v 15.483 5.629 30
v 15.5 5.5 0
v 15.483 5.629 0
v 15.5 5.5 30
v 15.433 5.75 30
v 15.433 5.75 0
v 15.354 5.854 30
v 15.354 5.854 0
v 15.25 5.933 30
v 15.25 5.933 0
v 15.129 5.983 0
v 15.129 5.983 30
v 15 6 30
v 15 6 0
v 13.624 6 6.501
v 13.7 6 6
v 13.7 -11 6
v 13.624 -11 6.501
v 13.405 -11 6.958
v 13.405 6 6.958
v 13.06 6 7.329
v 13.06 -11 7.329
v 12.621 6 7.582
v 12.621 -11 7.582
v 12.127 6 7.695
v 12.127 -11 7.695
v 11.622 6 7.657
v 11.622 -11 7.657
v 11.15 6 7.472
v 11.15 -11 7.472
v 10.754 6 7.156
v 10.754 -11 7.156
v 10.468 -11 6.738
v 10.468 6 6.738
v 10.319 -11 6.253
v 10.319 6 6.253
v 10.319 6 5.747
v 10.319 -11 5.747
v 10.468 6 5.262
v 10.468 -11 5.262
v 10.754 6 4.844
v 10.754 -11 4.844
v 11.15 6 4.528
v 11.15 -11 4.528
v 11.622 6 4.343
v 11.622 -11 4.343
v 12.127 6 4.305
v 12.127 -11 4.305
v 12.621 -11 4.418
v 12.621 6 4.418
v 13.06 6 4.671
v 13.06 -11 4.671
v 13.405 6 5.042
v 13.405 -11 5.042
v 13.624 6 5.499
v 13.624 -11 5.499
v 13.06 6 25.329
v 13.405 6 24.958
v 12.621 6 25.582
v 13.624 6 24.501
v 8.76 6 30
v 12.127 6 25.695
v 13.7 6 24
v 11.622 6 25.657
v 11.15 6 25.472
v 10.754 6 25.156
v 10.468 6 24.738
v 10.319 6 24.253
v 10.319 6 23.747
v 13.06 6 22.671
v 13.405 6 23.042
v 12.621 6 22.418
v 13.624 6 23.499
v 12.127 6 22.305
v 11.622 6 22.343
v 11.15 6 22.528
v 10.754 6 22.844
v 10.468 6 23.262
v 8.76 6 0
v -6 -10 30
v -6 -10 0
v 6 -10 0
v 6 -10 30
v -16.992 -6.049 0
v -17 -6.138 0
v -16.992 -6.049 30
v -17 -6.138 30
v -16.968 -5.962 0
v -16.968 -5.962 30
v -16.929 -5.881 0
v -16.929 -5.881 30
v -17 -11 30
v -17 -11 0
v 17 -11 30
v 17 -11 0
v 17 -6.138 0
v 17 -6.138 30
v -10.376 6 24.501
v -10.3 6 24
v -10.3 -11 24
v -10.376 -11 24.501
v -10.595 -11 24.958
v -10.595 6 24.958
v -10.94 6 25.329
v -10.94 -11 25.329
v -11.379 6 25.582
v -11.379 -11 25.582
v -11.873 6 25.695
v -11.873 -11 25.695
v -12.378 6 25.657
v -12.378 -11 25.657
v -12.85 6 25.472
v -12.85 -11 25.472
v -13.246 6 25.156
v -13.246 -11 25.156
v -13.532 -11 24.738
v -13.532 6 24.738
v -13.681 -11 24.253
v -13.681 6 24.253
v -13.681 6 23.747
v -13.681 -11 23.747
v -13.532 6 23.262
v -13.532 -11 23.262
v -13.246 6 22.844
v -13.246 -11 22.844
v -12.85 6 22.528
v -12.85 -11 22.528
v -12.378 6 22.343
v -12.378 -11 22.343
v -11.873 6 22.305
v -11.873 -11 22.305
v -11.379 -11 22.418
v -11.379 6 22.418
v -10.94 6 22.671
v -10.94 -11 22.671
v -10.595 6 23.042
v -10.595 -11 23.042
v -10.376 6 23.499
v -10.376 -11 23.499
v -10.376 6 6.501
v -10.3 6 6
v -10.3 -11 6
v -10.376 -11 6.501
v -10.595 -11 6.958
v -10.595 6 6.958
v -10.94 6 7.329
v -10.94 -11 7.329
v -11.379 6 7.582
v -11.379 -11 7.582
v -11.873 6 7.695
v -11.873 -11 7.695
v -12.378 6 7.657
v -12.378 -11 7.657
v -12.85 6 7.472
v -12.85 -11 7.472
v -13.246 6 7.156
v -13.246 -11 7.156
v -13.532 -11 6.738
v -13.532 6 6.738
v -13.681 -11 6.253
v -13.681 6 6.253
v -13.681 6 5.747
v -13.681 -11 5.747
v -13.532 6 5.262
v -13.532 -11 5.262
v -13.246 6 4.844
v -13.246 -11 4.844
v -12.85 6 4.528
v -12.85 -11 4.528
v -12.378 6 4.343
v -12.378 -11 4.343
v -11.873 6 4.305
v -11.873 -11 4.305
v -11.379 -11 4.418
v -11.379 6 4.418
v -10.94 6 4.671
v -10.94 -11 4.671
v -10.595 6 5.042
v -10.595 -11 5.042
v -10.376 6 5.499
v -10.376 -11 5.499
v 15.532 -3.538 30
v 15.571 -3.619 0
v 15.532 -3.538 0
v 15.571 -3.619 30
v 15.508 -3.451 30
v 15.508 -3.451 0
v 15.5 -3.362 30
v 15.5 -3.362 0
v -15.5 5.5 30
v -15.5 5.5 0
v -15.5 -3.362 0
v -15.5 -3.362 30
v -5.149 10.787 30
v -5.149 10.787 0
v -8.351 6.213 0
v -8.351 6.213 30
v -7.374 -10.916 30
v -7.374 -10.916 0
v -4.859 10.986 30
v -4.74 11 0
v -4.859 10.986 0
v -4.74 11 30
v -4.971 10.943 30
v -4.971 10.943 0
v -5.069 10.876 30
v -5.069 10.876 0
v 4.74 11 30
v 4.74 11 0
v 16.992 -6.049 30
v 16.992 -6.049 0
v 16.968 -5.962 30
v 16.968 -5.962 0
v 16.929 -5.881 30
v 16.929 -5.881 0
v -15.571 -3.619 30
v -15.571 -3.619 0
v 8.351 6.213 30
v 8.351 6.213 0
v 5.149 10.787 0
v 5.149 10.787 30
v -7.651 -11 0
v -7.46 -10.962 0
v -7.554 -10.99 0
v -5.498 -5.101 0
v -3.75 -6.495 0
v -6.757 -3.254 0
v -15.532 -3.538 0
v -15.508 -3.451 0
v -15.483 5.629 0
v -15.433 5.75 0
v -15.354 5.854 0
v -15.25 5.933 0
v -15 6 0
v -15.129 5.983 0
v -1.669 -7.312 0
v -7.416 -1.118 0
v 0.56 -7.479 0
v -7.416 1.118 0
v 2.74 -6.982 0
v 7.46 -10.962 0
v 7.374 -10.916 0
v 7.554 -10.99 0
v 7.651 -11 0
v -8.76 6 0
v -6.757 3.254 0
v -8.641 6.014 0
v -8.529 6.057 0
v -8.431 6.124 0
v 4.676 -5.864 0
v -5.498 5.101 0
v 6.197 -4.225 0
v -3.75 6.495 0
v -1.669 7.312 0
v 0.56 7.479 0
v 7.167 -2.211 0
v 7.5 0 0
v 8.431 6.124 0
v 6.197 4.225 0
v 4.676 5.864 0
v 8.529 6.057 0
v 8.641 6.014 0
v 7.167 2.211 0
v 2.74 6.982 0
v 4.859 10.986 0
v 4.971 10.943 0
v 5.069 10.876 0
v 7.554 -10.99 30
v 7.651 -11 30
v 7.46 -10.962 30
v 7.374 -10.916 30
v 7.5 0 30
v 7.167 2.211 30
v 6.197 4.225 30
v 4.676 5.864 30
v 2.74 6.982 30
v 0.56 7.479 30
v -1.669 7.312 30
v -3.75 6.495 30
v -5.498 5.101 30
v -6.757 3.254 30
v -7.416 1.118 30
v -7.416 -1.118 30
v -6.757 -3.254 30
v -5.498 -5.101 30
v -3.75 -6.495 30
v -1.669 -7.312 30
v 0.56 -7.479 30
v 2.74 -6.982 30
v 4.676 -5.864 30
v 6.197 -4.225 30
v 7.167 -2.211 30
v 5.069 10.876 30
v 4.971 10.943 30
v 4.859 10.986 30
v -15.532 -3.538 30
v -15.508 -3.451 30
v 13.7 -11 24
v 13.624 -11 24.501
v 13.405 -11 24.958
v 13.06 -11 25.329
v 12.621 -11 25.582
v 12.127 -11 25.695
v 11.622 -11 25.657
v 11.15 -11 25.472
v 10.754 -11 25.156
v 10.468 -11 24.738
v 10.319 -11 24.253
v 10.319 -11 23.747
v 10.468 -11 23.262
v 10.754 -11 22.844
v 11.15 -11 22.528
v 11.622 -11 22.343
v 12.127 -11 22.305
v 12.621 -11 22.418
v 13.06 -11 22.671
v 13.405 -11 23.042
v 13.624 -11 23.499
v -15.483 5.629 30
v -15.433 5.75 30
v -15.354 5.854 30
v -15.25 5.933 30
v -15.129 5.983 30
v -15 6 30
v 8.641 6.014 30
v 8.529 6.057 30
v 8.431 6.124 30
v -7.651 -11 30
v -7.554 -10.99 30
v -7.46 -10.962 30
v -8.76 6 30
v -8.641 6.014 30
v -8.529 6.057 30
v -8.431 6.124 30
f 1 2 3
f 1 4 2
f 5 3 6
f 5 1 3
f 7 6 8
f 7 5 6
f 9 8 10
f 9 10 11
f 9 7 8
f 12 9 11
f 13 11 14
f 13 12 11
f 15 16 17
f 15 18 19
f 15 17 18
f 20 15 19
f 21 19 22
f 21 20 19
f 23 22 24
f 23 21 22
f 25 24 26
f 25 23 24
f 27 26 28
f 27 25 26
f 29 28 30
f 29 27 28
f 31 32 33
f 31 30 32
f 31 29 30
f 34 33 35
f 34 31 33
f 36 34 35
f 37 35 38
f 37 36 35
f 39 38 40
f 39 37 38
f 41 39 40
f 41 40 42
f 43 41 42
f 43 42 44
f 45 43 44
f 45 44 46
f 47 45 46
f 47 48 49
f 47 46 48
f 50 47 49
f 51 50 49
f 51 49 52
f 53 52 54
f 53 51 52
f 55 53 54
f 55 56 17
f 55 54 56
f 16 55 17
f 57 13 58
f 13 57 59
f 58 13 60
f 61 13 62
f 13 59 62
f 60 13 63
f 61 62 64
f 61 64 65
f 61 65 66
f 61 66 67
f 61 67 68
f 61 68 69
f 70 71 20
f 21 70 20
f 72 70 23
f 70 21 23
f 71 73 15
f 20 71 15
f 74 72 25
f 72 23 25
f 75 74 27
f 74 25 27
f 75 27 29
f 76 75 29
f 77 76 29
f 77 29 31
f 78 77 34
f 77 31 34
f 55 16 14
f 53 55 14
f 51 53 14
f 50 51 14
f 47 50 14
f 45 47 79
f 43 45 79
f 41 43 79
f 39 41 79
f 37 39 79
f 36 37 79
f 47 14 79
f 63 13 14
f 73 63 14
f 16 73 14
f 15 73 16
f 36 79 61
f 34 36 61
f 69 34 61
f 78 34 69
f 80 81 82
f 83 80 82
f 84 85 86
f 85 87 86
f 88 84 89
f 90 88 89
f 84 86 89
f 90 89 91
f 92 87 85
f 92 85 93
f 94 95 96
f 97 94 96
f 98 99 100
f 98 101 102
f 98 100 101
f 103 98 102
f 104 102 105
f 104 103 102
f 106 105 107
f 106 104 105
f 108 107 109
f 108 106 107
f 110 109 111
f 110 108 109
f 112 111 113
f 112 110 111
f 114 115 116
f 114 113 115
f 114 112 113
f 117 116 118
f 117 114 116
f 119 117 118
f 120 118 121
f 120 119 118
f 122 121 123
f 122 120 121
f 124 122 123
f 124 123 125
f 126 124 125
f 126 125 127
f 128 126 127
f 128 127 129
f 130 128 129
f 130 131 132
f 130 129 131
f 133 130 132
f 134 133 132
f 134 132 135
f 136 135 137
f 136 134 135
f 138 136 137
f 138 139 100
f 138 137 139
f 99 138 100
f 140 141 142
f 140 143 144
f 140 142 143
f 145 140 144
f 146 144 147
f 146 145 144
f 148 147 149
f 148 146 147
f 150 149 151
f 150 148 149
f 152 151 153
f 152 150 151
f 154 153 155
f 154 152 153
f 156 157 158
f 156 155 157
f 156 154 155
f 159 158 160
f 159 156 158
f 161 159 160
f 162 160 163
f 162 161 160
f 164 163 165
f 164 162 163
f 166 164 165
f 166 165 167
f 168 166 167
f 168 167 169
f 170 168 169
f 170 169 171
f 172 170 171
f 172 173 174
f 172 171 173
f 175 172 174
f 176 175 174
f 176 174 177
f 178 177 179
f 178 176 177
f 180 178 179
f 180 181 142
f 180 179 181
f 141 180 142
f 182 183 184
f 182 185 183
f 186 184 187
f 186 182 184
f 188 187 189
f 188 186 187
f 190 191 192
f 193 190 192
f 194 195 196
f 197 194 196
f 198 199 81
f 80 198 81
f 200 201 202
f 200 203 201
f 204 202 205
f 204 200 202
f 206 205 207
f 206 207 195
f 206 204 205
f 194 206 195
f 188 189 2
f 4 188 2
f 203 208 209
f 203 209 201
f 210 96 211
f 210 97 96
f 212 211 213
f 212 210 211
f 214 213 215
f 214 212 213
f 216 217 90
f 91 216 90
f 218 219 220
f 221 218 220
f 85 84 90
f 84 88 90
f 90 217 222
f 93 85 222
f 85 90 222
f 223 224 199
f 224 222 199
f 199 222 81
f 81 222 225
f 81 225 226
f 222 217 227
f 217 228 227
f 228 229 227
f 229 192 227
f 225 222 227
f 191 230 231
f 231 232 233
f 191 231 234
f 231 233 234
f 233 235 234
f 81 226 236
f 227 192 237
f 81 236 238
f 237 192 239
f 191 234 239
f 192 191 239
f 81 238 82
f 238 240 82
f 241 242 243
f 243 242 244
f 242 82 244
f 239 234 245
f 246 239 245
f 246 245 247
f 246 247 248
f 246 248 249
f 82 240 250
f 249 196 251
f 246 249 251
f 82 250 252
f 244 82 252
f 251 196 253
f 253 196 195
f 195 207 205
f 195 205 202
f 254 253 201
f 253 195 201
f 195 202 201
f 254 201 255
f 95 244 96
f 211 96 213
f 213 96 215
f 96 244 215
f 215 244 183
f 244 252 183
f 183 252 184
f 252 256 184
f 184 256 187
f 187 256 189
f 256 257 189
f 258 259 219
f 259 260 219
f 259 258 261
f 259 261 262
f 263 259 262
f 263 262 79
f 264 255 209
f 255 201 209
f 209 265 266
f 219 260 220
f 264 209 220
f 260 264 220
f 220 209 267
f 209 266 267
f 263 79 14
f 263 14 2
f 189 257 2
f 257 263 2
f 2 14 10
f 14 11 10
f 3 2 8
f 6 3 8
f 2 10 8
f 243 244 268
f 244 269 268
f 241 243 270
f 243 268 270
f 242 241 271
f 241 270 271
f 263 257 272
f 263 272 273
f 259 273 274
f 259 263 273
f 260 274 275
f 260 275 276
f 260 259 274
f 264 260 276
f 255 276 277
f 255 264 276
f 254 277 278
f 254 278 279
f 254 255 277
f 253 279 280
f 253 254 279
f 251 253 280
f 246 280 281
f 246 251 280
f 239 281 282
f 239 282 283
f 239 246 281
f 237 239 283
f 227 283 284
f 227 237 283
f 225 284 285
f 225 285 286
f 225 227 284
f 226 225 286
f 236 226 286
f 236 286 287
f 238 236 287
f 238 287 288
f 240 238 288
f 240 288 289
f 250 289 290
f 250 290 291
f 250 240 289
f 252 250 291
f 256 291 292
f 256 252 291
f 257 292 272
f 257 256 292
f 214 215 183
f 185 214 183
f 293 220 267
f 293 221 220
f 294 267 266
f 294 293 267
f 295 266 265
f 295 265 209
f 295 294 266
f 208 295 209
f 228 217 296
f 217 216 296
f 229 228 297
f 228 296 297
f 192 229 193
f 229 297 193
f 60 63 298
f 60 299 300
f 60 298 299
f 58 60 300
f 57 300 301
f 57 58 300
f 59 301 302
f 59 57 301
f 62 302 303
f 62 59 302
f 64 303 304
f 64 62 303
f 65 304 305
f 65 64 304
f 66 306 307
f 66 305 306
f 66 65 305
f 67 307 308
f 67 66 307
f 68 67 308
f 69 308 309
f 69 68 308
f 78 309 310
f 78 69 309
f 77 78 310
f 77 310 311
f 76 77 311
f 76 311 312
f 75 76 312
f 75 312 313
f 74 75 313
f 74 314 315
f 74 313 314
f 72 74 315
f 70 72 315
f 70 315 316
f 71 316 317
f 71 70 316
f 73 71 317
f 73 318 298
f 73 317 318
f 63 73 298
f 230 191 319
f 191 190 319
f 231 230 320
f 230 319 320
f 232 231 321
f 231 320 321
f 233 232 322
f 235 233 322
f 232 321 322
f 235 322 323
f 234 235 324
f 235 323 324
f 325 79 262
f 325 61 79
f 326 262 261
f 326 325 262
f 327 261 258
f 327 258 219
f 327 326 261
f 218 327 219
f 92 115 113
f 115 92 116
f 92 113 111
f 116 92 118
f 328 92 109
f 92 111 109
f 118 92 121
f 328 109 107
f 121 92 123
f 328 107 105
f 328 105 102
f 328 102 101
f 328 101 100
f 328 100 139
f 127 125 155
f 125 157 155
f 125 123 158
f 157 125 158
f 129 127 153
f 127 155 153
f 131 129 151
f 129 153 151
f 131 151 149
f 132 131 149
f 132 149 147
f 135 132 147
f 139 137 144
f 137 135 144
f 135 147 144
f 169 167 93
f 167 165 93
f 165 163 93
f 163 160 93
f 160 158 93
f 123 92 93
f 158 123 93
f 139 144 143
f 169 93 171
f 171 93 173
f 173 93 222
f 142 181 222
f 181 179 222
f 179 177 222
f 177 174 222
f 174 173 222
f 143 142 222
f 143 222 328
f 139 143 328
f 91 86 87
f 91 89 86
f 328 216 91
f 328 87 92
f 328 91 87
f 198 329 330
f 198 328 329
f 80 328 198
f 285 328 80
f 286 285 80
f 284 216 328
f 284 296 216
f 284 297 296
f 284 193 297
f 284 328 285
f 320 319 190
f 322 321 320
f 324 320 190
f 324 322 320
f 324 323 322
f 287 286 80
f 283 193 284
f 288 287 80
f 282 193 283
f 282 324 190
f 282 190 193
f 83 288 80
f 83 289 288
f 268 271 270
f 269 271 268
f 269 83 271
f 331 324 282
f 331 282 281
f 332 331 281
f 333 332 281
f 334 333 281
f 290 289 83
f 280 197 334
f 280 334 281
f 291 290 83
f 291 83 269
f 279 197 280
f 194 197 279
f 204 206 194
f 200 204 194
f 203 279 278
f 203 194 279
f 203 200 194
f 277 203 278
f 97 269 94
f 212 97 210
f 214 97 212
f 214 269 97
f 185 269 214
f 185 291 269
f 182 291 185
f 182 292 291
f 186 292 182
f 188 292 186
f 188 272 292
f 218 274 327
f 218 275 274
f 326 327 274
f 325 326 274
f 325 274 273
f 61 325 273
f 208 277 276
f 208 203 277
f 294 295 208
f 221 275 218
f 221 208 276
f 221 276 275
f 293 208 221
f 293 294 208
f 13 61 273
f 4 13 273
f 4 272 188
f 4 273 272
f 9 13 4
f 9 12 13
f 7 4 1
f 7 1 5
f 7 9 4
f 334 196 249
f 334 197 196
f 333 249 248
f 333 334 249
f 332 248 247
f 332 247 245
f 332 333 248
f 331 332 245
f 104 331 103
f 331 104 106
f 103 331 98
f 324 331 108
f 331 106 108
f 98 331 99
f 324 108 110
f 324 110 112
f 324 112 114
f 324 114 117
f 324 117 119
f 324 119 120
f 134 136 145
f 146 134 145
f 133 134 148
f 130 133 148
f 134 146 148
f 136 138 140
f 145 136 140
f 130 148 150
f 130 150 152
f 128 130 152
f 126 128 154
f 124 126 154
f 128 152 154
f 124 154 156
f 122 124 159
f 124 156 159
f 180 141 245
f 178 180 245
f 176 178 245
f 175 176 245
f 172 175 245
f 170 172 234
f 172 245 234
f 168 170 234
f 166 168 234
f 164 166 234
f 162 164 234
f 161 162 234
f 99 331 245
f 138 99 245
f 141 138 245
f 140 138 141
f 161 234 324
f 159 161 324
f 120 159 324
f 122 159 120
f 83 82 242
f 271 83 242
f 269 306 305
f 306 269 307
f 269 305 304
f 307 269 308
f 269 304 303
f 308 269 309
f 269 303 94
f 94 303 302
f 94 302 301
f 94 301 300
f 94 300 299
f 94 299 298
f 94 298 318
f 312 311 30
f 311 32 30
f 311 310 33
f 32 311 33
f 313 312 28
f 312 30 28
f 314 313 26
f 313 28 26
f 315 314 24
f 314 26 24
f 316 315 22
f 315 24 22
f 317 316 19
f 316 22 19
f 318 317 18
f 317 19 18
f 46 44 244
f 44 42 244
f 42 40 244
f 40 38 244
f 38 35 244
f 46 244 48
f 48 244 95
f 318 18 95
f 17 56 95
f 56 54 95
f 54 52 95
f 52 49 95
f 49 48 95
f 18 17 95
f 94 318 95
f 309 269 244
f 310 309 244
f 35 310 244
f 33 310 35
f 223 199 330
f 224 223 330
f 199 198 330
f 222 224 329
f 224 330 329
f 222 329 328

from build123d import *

# Parameters (mm, degrees)
SKETCH_R     = 7.5
PAD_DEPTH    = 30
SKETCH001_R  = 1.7
POCKET_DEPTH = 61.001
FILLET_R     = 0.5


with BuildPart() as part:
    # Sketch → Pad (new body)
    with BuildSketch(Plane.XY):
        Polygon((7.5, -11), (17, -11), (17, -6), (15.5, -3.5), (15.5, 6), (8.5, 6), (5, 11), (0, 11), (-5, 11), (-8.5, 6), (-15.5, 6), (-15.5, -3.5), (-17, -6), (-17, -11), (-7.5, -11), (-6, -10), (0, -10), (6, -10), align=None)
        Circle(SKETCH_R, mode=Mode.SUBTRACT)
    extrude(amount=PAD_DEPTH)

    # Sketch001 → Pocket (cut, through all)
    with BuildSketch(Plane.XZ.offset(-50)):
        with Locations((-12, 24)):
            Circle(SKETCH001_R)
        with Locations((12, 24)):
            Circle(SKETCH001_R)
        with Locations((-12, 6)):
            Circle(SKETCH001_R)
        with Locations((12, 6)):
            Circle(SKETCH001_R)
    extrude(amount=POCKET_DEPTH, mode=Mode.SUBTRACT)

    # Fillet
    fillet_edges = [part.edges().sort_by_distance(p)[0] for p in [
        (-5, 11, 15),
        (5, 11, 15),
        (-15.5, 6, 15),
        (-17, -6, 15),
        (15.5, 6, 15),
        (17, -6, 15),
        (-7.5, -11, 15),
        (7.5, -11, 15),
        (-8.5, 6, 15),
        (8.5, 6, 15),
        (-15.5, -3.5, 15),
        (15.5, -3.5, 15),
    ]]
    fillet(fillet_edges, radius=FILLET_R)


solid = part.part
